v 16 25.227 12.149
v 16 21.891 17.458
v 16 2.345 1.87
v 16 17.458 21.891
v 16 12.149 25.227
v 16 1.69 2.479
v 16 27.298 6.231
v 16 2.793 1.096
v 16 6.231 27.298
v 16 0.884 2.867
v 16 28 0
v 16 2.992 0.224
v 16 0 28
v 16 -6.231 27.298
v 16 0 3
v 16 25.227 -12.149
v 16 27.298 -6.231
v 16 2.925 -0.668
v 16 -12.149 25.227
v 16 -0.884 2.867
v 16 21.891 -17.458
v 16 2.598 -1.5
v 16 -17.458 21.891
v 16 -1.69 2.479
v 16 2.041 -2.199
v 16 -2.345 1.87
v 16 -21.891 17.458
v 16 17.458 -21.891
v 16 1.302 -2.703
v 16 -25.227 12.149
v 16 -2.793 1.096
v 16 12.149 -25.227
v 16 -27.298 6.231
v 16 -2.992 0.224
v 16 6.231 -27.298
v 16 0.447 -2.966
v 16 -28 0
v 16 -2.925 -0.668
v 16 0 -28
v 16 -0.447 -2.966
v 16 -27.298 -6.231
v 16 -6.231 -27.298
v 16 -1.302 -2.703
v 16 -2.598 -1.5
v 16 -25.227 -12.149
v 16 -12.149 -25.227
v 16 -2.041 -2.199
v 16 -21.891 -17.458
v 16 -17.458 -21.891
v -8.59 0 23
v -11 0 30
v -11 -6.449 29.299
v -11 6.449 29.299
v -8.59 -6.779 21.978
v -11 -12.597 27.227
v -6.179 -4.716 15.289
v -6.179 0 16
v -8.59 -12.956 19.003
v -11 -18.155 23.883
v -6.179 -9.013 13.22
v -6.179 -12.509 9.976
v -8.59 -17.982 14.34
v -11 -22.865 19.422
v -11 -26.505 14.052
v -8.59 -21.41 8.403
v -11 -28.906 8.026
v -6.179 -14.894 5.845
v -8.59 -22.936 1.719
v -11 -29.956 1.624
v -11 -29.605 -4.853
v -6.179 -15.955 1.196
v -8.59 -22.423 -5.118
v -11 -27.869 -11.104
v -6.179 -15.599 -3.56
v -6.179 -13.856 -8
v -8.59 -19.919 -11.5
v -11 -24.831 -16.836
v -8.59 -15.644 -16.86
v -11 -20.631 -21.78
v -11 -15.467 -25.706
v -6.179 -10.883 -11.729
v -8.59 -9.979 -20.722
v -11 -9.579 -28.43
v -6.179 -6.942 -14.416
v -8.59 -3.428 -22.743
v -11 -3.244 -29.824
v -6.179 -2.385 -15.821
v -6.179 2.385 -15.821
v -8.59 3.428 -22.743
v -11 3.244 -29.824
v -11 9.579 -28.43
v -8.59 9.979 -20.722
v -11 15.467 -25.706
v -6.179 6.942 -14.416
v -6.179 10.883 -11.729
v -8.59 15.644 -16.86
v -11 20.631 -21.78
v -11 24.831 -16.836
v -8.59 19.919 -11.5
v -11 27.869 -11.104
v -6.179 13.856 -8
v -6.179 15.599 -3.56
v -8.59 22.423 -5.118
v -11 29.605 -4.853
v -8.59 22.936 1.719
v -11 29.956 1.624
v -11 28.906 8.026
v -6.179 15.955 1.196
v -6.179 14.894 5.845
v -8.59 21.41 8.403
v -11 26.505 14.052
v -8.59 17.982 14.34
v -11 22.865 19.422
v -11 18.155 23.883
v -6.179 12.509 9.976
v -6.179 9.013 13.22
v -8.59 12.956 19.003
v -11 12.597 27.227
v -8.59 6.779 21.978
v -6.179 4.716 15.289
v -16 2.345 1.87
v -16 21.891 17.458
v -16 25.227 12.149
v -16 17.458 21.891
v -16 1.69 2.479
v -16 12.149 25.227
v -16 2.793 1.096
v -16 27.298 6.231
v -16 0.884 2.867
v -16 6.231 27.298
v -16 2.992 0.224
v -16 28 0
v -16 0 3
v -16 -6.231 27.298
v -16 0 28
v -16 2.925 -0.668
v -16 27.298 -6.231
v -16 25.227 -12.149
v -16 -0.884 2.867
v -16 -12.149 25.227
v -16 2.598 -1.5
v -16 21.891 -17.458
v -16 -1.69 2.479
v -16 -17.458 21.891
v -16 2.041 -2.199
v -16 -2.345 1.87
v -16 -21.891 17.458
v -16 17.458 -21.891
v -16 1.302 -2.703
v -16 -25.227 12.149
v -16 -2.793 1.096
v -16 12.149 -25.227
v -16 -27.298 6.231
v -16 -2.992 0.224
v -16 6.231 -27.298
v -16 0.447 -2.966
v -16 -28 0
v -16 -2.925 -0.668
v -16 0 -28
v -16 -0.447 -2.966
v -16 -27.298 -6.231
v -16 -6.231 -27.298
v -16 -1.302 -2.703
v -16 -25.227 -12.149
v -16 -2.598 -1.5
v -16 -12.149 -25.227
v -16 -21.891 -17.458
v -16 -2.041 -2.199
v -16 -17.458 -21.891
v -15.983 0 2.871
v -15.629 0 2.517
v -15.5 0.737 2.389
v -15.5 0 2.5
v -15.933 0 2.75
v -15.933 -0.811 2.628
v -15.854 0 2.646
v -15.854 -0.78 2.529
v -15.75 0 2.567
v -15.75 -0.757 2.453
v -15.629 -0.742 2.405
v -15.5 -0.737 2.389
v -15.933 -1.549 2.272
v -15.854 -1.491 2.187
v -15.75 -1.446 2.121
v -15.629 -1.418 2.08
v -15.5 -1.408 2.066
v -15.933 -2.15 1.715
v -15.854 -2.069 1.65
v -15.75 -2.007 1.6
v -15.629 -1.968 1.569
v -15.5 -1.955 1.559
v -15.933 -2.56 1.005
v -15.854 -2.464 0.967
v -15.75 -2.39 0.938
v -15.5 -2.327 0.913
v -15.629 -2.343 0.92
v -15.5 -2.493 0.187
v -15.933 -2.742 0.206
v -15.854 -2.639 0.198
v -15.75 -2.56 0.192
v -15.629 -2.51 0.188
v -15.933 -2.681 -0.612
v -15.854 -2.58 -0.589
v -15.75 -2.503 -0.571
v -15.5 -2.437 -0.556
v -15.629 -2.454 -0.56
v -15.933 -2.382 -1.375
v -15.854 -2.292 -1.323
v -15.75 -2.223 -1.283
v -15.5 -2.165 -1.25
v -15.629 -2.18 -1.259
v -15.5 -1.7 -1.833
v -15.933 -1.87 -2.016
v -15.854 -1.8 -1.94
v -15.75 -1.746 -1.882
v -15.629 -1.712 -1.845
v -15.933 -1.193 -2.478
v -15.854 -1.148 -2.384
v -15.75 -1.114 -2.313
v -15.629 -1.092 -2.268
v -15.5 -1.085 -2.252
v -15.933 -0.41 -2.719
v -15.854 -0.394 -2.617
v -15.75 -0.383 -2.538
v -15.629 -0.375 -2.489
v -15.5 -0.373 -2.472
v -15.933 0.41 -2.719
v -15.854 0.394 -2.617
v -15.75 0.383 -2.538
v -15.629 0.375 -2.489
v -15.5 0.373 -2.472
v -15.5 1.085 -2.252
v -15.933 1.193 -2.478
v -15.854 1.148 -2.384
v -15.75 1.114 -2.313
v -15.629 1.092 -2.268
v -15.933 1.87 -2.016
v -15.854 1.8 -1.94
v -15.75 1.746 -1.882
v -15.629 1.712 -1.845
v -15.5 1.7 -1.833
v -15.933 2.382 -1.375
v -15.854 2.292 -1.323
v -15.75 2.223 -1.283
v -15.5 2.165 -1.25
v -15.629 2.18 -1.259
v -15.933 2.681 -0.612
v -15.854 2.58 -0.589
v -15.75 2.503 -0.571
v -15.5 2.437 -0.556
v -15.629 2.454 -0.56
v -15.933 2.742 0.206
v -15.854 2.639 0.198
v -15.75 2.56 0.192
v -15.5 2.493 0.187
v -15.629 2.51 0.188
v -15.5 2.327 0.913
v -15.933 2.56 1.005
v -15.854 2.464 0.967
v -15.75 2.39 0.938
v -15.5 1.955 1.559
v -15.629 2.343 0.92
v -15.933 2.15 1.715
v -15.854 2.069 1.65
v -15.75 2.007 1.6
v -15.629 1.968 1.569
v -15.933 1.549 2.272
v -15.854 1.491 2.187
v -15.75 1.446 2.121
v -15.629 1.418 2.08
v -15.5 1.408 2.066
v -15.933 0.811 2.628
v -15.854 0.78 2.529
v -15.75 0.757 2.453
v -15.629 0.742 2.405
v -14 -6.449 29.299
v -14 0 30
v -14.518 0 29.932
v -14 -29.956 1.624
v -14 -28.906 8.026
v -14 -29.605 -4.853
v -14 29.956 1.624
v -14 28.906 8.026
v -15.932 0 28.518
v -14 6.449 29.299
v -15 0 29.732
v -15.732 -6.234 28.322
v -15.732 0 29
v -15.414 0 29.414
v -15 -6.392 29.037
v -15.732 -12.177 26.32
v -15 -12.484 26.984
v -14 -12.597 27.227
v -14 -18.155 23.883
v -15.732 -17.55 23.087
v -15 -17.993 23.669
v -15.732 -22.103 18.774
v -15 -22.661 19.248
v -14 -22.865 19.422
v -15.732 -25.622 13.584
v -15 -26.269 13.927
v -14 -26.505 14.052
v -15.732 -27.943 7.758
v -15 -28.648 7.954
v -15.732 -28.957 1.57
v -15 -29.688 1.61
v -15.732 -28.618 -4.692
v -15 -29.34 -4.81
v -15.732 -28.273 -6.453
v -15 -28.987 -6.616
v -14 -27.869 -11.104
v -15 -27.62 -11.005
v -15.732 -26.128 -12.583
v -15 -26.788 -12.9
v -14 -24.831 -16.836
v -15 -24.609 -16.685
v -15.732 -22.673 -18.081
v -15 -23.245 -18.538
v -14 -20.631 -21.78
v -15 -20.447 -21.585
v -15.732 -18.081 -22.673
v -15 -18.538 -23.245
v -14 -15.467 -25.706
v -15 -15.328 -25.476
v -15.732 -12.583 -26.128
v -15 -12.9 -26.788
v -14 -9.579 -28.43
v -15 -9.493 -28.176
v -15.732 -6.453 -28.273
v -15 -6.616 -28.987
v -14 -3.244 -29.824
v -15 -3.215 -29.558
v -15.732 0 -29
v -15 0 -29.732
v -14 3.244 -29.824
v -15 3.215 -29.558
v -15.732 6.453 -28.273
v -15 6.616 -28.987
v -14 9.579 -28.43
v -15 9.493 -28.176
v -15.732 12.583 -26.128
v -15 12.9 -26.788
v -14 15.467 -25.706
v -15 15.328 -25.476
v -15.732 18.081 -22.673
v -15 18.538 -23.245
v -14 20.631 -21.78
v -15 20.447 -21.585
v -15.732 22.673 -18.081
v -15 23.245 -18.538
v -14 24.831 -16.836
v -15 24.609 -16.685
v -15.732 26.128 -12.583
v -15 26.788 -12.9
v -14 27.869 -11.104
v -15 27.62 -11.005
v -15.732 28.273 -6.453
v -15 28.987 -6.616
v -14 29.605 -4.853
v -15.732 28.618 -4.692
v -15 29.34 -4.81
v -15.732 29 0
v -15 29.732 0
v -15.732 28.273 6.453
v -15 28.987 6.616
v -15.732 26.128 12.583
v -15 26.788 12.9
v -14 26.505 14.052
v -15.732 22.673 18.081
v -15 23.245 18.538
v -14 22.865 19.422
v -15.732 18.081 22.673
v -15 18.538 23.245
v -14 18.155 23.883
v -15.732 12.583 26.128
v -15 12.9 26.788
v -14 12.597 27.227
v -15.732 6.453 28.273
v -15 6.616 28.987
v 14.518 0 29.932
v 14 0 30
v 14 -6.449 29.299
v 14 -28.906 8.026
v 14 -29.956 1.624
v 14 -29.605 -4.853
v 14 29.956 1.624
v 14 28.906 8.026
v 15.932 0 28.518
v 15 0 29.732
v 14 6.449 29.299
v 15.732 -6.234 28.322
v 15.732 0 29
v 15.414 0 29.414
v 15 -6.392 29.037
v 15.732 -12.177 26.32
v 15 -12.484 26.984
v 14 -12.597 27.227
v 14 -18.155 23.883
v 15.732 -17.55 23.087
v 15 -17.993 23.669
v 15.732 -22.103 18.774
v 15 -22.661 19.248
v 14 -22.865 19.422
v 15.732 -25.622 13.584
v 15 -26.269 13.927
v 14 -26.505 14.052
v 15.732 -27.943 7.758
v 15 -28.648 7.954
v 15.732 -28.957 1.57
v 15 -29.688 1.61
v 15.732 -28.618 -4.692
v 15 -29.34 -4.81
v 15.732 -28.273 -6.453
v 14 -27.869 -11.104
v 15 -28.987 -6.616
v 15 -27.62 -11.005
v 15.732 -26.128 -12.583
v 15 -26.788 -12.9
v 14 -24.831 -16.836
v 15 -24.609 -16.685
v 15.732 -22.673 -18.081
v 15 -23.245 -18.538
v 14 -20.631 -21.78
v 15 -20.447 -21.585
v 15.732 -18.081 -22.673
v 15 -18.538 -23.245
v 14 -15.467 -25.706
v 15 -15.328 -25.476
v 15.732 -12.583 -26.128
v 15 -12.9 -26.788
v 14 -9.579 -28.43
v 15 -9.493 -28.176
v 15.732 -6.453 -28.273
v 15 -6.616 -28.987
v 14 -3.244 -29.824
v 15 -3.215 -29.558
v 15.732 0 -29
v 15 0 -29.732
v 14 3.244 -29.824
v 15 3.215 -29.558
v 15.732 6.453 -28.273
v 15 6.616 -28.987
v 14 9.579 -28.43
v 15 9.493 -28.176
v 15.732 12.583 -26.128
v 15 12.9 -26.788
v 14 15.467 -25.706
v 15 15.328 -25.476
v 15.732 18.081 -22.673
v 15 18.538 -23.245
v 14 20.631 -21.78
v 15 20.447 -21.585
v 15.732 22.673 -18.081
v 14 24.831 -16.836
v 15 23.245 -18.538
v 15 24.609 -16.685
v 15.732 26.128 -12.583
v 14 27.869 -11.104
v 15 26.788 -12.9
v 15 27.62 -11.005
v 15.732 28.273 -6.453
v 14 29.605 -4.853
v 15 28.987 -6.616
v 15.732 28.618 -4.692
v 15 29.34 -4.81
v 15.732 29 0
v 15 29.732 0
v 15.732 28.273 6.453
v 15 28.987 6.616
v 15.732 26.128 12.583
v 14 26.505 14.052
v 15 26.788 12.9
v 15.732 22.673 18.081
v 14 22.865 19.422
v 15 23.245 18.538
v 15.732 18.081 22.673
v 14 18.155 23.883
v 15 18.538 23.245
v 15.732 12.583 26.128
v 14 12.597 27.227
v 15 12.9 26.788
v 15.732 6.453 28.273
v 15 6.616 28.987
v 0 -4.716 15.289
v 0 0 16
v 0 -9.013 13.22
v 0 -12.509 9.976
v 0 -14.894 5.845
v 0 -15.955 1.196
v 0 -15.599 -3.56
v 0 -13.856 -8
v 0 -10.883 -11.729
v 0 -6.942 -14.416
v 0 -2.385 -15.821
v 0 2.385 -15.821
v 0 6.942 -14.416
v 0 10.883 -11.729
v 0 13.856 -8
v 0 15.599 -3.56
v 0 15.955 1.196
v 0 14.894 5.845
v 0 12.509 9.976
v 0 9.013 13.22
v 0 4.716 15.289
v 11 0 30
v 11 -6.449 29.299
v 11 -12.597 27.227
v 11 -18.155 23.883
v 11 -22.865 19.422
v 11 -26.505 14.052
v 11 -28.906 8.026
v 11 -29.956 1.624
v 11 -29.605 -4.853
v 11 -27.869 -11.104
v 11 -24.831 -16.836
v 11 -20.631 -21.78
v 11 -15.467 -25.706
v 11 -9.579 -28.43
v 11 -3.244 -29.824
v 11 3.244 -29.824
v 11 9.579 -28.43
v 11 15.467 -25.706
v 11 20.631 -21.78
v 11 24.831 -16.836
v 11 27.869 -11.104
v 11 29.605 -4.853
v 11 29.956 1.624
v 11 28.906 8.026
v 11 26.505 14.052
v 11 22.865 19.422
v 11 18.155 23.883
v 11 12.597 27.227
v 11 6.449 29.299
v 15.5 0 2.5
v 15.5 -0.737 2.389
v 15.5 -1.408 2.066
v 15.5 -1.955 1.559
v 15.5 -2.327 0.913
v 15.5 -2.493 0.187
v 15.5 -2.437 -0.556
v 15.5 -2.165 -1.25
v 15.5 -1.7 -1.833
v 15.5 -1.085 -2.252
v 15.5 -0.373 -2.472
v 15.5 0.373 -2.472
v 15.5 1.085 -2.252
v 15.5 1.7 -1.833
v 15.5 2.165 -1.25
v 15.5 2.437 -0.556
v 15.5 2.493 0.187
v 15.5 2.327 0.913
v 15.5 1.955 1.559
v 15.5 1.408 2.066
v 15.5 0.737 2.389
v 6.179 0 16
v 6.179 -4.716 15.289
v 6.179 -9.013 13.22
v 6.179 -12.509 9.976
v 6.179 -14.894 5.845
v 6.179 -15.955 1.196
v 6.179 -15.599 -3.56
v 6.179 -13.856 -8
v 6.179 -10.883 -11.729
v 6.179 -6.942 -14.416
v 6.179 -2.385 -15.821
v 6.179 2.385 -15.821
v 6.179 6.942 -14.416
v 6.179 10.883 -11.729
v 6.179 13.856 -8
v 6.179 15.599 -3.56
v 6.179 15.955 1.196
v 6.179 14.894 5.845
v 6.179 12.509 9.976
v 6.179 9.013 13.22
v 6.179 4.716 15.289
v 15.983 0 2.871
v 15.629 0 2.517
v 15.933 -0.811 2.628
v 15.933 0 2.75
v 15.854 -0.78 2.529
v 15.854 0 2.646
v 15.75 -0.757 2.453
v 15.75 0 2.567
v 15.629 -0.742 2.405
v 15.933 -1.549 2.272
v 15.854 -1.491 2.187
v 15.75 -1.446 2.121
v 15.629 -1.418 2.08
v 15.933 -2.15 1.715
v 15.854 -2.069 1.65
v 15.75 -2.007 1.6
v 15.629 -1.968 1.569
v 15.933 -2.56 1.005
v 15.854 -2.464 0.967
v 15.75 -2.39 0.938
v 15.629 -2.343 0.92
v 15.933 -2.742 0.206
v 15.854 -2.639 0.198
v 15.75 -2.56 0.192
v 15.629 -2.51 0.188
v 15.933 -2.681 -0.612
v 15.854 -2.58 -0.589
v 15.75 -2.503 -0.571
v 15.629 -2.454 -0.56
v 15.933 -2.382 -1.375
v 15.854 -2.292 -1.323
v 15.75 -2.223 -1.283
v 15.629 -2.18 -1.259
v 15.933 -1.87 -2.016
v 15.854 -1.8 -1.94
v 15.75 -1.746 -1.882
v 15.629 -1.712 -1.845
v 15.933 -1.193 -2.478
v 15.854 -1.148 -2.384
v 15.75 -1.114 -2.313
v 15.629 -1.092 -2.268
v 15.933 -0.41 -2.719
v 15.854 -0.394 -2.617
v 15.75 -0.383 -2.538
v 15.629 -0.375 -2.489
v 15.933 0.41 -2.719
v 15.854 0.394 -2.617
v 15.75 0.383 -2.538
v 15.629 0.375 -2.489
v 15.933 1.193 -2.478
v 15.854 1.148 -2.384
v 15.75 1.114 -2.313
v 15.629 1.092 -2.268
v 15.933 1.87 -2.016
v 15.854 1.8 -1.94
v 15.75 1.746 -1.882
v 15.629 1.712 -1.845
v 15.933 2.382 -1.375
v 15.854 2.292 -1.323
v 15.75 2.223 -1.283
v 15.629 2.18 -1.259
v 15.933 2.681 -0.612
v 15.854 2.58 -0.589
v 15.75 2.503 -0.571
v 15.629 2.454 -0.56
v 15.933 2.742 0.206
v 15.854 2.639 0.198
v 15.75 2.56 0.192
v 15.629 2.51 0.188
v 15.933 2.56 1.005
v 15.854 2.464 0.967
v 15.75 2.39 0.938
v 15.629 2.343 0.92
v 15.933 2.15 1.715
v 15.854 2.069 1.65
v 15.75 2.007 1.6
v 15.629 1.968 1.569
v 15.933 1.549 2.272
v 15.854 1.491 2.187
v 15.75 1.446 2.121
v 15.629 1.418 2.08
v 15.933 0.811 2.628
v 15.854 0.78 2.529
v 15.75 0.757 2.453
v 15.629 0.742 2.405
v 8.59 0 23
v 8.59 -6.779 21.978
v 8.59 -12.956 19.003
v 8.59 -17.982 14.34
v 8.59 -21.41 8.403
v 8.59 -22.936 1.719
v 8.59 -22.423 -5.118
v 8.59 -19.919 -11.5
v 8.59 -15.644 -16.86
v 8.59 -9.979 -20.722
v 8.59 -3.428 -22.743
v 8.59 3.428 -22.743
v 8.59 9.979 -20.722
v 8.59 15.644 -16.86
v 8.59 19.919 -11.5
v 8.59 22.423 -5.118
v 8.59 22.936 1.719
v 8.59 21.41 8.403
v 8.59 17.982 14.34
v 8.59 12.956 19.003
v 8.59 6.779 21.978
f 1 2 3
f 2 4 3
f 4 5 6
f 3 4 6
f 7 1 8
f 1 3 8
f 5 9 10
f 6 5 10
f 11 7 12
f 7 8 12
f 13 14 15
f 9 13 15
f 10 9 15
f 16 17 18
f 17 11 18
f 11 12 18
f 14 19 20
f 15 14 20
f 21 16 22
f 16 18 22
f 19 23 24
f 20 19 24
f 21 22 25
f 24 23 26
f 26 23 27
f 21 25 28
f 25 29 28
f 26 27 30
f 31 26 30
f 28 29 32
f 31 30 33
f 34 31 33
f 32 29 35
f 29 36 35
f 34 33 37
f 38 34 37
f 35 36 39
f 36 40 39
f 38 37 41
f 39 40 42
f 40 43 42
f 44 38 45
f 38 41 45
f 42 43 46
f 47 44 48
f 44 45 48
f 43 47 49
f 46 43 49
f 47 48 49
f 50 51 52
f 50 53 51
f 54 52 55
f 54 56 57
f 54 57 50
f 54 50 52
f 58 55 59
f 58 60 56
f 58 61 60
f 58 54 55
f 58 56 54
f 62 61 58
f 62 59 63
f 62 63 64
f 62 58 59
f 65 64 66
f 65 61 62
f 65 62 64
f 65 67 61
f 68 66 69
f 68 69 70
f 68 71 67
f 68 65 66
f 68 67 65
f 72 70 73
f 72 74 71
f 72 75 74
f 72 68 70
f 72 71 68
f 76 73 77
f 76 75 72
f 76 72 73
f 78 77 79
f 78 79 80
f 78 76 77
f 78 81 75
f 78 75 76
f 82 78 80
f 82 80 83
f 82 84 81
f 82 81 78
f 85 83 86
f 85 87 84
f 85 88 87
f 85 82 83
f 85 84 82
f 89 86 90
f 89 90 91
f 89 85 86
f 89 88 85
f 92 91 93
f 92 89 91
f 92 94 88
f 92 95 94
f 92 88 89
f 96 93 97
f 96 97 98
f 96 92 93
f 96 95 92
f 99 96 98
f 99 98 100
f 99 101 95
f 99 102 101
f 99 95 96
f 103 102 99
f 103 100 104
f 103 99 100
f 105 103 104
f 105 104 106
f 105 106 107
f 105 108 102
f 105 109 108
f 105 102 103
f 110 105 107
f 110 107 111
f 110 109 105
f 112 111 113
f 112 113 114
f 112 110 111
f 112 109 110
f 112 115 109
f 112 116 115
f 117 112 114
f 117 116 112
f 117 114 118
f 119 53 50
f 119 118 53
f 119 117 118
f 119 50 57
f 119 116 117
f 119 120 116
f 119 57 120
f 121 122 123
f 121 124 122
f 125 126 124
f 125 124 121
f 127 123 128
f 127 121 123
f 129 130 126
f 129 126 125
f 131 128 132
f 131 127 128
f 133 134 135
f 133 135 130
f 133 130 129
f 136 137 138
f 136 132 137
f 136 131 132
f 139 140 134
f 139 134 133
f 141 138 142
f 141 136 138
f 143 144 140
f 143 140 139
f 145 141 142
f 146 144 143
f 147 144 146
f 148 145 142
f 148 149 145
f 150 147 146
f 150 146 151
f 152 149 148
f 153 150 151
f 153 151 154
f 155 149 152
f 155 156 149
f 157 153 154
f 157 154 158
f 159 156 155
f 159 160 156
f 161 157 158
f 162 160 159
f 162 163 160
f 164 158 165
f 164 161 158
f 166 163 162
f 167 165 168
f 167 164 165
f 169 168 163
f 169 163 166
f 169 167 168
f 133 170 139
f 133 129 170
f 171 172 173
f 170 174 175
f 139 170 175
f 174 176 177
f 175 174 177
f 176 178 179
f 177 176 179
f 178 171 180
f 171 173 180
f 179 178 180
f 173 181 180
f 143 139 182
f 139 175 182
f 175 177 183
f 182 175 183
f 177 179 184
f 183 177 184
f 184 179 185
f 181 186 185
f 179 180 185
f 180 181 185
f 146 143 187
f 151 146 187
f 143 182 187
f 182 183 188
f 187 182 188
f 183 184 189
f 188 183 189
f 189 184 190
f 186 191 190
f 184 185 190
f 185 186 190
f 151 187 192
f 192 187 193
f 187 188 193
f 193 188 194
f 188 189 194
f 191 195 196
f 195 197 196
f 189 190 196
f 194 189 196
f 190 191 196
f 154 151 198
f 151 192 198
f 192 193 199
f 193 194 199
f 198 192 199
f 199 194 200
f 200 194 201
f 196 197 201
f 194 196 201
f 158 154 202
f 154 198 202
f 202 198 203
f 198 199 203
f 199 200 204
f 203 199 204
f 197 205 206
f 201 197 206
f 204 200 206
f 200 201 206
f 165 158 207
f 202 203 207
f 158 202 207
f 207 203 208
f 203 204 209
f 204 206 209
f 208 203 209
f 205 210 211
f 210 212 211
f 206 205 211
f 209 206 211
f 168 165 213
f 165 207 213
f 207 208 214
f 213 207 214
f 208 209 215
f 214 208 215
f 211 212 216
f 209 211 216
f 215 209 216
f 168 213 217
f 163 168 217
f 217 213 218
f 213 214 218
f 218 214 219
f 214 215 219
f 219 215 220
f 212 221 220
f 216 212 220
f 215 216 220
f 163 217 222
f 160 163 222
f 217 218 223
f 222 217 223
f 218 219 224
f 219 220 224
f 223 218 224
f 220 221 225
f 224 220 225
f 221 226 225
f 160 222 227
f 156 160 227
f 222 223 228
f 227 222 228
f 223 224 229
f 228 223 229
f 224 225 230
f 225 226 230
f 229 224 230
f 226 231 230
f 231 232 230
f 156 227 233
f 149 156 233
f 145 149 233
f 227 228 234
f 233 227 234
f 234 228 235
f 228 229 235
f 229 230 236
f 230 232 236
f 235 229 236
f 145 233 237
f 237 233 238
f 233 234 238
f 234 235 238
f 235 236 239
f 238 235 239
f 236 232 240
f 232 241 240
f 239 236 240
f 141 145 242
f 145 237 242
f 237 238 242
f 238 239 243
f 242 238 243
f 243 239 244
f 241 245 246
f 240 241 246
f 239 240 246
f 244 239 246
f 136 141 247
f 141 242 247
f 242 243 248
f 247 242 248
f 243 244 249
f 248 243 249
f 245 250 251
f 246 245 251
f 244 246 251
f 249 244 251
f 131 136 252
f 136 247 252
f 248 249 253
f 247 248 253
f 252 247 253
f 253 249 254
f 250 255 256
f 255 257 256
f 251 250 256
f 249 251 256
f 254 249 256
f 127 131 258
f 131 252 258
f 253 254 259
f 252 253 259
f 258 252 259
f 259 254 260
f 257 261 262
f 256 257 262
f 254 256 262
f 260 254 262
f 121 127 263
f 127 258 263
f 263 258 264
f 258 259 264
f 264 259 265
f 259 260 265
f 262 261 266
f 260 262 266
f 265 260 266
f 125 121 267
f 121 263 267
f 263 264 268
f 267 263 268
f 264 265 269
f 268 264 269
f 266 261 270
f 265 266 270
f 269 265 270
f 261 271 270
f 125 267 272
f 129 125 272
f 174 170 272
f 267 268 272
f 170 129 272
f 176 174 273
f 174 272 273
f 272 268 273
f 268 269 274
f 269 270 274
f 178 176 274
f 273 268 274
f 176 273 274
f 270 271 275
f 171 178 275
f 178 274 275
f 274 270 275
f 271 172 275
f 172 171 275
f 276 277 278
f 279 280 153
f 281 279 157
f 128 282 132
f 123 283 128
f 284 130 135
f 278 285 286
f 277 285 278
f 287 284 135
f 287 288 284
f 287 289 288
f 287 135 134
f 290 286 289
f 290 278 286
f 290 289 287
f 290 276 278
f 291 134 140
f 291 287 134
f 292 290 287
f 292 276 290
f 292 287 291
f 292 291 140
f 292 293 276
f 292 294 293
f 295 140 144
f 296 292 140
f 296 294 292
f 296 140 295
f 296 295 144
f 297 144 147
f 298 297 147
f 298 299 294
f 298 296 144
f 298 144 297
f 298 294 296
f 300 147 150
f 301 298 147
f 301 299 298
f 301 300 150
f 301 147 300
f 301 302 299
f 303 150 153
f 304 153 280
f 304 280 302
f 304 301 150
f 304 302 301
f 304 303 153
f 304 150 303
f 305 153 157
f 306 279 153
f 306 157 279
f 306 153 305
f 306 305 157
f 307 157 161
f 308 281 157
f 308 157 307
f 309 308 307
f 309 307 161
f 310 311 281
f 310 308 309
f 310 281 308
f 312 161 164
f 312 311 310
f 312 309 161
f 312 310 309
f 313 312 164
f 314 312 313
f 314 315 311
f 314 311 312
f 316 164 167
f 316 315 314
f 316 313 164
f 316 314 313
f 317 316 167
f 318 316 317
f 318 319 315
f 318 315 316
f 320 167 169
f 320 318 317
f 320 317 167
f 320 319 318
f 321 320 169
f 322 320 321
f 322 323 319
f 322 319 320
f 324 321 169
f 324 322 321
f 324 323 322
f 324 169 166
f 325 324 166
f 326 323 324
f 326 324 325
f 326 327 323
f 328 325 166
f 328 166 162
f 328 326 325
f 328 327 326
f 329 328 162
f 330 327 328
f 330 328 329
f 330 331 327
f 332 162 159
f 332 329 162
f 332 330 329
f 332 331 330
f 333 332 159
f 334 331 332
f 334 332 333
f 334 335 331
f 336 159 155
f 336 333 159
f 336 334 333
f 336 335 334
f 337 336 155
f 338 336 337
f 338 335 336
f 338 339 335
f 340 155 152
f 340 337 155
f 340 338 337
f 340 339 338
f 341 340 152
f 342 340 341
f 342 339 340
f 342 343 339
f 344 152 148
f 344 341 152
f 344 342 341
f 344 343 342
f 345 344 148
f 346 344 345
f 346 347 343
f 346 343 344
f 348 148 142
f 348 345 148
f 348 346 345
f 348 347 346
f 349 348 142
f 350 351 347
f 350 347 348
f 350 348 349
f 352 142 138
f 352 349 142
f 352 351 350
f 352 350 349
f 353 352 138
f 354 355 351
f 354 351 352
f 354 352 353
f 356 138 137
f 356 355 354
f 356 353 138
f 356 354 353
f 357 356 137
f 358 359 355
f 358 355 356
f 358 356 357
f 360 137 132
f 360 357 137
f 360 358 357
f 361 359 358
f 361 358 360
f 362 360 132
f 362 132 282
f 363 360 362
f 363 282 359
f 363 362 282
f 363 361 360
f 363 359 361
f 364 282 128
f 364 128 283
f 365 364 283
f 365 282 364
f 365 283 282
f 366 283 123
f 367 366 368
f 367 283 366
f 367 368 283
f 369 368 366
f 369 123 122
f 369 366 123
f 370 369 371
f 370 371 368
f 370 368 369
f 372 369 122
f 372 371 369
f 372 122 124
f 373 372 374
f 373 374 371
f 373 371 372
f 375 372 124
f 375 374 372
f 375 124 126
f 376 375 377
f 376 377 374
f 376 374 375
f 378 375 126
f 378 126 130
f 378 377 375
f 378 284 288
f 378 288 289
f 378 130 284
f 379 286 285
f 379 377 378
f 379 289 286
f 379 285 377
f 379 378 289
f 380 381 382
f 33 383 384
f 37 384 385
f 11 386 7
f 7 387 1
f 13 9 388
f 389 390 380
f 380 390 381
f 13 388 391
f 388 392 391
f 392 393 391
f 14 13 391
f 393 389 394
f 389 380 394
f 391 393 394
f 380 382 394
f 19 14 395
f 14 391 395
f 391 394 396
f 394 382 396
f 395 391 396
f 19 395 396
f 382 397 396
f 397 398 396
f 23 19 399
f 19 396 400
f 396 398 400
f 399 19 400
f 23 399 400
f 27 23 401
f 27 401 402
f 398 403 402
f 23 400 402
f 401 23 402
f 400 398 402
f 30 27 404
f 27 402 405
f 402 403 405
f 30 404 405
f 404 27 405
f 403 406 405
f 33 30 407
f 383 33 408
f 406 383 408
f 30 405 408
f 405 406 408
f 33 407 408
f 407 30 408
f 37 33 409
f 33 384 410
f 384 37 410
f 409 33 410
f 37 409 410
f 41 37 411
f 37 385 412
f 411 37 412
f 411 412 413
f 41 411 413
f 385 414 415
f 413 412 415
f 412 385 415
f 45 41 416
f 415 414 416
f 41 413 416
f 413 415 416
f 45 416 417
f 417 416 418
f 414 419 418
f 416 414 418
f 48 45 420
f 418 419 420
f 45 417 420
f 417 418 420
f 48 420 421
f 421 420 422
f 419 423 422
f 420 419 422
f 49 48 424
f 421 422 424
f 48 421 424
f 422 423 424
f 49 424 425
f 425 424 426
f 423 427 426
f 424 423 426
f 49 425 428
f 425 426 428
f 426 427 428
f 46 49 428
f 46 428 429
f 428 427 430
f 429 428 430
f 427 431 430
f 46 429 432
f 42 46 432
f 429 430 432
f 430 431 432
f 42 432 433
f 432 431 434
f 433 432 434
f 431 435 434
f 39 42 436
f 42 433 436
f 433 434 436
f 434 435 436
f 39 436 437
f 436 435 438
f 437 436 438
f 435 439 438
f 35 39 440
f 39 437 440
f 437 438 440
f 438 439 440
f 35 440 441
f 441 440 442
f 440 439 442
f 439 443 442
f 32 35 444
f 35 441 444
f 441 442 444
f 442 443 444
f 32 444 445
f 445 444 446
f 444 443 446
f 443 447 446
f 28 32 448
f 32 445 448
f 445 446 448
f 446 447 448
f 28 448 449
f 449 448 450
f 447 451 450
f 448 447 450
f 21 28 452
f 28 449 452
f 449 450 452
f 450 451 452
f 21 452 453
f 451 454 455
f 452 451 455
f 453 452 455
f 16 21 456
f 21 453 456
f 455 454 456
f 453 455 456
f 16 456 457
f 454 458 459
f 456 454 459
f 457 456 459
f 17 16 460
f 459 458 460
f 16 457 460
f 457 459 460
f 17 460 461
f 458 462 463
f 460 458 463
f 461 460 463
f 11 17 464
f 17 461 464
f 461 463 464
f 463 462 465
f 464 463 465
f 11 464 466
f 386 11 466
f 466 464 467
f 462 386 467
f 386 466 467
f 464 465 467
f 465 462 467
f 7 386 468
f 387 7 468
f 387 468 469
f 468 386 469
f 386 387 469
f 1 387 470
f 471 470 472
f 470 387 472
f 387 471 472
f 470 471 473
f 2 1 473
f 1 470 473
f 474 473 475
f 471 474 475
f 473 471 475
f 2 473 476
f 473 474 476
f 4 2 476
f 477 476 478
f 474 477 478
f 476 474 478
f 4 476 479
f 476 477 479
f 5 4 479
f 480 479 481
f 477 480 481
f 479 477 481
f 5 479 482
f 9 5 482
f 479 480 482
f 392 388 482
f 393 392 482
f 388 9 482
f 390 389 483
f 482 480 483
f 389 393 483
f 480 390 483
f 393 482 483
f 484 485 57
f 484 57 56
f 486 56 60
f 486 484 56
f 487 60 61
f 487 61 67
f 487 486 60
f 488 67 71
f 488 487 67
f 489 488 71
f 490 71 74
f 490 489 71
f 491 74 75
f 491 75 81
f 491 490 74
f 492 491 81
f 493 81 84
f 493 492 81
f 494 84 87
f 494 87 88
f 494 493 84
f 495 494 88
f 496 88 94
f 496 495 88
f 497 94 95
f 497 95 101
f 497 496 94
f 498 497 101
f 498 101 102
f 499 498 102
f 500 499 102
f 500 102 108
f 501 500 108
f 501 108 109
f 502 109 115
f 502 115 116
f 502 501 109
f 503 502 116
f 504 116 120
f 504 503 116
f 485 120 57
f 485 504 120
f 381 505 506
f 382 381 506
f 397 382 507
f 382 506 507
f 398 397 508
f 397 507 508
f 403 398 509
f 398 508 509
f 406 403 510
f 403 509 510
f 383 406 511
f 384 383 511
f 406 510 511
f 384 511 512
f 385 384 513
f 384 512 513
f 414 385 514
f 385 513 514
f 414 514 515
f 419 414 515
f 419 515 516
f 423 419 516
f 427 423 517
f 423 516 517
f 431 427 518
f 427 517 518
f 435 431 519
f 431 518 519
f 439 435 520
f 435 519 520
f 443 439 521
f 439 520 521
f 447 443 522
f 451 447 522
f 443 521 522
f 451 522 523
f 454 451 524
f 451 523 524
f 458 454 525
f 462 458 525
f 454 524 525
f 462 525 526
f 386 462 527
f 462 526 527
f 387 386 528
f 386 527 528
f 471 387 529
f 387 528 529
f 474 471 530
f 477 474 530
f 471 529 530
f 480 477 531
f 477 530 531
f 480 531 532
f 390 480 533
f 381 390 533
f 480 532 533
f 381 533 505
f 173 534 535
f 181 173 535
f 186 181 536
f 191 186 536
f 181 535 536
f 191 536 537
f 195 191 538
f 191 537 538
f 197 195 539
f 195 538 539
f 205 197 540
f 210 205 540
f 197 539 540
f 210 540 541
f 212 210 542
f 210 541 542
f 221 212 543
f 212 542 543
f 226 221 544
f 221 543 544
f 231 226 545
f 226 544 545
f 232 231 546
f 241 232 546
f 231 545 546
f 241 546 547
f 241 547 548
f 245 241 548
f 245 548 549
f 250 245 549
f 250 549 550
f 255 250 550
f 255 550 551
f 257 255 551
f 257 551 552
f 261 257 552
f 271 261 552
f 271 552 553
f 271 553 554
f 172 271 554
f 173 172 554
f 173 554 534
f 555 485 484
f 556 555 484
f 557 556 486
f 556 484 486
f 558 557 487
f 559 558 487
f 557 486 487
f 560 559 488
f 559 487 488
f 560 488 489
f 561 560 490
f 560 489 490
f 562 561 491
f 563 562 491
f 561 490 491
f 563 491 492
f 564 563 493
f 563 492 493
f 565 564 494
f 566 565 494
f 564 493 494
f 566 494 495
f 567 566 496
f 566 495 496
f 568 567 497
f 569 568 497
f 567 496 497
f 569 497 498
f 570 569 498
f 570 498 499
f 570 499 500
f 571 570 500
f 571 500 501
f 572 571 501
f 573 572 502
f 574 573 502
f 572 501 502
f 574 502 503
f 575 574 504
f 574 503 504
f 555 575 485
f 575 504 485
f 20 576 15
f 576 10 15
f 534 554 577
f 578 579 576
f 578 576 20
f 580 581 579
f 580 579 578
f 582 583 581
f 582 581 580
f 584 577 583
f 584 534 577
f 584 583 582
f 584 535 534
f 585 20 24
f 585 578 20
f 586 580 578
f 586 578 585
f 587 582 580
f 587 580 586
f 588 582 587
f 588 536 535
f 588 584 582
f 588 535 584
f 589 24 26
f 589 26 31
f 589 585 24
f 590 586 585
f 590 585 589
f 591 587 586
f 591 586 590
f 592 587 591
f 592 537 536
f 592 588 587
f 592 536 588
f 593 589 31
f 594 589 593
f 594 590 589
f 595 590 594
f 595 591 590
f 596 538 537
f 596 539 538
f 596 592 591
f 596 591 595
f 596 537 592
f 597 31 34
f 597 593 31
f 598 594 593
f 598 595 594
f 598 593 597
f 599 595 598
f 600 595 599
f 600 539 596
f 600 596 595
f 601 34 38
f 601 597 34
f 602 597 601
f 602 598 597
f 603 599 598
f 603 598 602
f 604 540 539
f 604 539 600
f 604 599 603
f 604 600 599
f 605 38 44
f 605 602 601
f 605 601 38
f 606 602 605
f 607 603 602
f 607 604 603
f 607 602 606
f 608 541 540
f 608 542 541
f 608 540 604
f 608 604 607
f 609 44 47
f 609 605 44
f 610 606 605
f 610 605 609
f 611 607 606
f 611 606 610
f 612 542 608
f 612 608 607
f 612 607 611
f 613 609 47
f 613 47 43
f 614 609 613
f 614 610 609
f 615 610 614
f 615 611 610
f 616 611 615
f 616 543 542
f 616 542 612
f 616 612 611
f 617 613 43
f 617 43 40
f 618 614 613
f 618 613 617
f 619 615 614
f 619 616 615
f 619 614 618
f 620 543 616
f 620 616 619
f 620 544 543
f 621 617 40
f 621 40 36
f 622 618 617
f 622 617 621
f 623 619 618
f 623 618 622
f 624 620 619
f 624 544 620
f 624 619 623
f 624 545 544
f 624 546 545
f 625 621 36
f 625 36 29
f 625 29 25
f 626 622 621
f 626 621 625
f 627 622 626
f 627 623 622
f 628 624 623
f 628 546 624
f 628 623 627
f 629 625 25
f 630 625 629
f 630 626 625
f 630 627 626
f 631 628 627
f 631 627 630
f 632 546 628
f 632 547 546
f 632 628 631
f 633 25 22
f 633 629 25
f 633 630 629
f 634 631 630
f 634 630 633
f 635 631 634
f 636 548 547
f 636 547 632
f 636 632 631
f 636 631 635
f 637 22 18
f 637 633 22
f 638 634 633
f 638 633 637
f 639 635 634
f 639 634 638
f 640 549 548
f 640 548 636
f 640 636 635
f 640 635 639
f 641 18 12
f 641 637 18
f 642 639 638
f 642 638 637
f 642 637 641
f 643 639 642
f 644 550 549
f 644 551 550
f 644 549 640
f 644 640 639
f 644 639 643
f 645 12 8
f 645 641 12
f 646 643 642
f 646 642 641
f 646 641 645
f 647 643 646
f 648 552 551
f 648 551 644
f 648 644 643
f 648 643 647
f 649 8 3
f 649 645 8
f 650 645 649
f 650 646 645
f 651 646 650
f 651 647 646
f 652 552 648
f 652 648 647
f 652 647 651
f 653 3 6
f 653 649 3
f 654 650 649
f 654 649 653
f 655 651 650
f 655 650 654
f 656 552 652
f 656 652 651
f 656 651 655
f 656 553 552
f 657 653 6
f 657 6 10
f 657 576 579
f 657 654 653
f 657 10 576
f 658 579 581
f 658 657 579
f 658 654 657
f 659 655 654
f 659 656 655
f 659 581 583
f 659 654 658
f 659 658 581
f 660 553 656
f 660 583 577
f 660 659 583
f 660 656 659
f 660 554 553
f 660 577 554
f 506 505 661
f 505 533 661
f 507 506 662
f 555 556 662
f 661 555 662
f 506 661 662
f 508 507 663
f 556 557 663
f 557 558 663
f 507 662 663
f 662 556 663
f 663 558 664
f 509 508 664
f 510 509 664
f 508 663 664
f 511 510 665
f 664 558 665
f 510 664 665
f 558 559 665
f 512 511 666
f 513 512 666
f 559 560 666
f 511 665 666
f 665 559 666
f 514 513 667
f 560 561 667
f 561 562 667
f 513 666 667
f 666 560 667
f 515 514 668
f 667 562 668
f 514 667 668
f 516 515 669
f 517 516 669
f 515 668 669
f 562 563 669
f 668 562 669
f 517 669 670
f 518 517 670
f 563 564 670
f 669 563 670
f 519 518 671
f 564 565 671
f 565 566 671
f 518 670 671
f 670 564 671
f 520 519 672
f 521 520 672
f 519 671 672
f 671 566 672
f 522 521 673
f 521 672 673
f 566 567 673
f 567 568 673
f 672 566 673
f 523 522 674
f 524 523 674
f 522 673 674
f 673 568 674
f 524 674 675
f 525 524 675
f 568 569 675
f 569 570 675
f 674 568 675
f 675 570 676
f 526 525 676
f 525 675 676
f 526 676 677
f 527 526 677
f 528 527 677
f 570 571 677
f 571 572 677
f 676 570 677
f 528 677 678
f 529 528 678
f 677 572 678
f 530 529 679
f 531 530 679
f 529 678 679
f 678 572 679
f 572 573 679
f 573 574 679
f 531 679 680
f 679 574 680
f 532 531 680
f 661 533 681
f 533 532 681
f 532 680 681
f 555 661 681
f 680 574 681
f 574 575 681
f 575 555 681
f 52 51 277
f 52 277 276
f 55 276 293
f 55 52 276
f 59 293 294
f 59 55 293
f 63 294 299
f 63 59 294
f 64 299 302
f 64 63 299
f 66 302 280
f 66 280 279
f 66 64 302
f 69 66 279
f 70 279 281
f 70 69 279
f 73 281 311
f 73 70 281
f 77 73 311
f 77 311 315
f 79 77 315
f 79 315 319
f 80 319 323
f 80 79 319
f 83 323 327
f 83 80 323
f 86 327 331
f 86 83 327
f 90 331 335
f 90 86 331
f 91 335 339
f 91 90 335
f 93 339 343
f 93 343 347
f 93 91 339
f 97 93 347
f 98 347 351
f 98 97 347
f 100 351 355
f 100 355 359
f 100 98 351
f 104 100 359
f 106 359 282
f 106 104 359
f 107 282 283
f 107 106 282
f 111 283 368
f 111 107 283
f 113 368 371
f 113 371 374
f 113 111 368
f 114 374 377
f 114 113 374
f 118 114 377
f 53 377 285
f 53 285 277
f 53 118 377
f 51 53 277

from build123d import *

# Parameters (mm, degrees)
REDONDEO2_R = 2
REDONDEO3_R = 0.5


with BuildPart() as part:
    # Croquis1 → Revolución1 (revolve)
    with BuildSketch(Plane.XY, mode=Mode.PRIVATE) as revoluci_n1_sk:
        Polygon((-16, 2.5), (-16, 30), (-11, 30), (-6.179413414, 16), (0, 16), (0, 2.5), align=None)
    revolve(revoluci_n1_sk.sketch.rotate(Axis((-29.031578947, 0, 0), (1, 0, 0)), 90), axis=Axis((-29.031578947, 0, 0), (1, 0, 0)))

    # Redondeo2
    redondeo2_edges = [part.edges().sort_by_distance(p)[0] for p in [
        (-16, 0, -30),
    ]]
    fillet(redondeo2_edges, radius=REDONDEO2_R)

    # Redondeo3
    redondeo3_edges = [part.edges().sort_by_distance(p)[0] for p in [
        (-16, 0, -2.5),
    ]]
    fillet(redondeo3_edges, radius=REDONDEO3_R)

    # Simetría2: part across plane


with BuildPart() as part_1:
    add(part.part)
    add(part.part.mirror(Plane(origin=(0, 0, 0), x_dir=(0, 0, 1), z_dir=(1, 0, 0))))


solid = part_1.part
